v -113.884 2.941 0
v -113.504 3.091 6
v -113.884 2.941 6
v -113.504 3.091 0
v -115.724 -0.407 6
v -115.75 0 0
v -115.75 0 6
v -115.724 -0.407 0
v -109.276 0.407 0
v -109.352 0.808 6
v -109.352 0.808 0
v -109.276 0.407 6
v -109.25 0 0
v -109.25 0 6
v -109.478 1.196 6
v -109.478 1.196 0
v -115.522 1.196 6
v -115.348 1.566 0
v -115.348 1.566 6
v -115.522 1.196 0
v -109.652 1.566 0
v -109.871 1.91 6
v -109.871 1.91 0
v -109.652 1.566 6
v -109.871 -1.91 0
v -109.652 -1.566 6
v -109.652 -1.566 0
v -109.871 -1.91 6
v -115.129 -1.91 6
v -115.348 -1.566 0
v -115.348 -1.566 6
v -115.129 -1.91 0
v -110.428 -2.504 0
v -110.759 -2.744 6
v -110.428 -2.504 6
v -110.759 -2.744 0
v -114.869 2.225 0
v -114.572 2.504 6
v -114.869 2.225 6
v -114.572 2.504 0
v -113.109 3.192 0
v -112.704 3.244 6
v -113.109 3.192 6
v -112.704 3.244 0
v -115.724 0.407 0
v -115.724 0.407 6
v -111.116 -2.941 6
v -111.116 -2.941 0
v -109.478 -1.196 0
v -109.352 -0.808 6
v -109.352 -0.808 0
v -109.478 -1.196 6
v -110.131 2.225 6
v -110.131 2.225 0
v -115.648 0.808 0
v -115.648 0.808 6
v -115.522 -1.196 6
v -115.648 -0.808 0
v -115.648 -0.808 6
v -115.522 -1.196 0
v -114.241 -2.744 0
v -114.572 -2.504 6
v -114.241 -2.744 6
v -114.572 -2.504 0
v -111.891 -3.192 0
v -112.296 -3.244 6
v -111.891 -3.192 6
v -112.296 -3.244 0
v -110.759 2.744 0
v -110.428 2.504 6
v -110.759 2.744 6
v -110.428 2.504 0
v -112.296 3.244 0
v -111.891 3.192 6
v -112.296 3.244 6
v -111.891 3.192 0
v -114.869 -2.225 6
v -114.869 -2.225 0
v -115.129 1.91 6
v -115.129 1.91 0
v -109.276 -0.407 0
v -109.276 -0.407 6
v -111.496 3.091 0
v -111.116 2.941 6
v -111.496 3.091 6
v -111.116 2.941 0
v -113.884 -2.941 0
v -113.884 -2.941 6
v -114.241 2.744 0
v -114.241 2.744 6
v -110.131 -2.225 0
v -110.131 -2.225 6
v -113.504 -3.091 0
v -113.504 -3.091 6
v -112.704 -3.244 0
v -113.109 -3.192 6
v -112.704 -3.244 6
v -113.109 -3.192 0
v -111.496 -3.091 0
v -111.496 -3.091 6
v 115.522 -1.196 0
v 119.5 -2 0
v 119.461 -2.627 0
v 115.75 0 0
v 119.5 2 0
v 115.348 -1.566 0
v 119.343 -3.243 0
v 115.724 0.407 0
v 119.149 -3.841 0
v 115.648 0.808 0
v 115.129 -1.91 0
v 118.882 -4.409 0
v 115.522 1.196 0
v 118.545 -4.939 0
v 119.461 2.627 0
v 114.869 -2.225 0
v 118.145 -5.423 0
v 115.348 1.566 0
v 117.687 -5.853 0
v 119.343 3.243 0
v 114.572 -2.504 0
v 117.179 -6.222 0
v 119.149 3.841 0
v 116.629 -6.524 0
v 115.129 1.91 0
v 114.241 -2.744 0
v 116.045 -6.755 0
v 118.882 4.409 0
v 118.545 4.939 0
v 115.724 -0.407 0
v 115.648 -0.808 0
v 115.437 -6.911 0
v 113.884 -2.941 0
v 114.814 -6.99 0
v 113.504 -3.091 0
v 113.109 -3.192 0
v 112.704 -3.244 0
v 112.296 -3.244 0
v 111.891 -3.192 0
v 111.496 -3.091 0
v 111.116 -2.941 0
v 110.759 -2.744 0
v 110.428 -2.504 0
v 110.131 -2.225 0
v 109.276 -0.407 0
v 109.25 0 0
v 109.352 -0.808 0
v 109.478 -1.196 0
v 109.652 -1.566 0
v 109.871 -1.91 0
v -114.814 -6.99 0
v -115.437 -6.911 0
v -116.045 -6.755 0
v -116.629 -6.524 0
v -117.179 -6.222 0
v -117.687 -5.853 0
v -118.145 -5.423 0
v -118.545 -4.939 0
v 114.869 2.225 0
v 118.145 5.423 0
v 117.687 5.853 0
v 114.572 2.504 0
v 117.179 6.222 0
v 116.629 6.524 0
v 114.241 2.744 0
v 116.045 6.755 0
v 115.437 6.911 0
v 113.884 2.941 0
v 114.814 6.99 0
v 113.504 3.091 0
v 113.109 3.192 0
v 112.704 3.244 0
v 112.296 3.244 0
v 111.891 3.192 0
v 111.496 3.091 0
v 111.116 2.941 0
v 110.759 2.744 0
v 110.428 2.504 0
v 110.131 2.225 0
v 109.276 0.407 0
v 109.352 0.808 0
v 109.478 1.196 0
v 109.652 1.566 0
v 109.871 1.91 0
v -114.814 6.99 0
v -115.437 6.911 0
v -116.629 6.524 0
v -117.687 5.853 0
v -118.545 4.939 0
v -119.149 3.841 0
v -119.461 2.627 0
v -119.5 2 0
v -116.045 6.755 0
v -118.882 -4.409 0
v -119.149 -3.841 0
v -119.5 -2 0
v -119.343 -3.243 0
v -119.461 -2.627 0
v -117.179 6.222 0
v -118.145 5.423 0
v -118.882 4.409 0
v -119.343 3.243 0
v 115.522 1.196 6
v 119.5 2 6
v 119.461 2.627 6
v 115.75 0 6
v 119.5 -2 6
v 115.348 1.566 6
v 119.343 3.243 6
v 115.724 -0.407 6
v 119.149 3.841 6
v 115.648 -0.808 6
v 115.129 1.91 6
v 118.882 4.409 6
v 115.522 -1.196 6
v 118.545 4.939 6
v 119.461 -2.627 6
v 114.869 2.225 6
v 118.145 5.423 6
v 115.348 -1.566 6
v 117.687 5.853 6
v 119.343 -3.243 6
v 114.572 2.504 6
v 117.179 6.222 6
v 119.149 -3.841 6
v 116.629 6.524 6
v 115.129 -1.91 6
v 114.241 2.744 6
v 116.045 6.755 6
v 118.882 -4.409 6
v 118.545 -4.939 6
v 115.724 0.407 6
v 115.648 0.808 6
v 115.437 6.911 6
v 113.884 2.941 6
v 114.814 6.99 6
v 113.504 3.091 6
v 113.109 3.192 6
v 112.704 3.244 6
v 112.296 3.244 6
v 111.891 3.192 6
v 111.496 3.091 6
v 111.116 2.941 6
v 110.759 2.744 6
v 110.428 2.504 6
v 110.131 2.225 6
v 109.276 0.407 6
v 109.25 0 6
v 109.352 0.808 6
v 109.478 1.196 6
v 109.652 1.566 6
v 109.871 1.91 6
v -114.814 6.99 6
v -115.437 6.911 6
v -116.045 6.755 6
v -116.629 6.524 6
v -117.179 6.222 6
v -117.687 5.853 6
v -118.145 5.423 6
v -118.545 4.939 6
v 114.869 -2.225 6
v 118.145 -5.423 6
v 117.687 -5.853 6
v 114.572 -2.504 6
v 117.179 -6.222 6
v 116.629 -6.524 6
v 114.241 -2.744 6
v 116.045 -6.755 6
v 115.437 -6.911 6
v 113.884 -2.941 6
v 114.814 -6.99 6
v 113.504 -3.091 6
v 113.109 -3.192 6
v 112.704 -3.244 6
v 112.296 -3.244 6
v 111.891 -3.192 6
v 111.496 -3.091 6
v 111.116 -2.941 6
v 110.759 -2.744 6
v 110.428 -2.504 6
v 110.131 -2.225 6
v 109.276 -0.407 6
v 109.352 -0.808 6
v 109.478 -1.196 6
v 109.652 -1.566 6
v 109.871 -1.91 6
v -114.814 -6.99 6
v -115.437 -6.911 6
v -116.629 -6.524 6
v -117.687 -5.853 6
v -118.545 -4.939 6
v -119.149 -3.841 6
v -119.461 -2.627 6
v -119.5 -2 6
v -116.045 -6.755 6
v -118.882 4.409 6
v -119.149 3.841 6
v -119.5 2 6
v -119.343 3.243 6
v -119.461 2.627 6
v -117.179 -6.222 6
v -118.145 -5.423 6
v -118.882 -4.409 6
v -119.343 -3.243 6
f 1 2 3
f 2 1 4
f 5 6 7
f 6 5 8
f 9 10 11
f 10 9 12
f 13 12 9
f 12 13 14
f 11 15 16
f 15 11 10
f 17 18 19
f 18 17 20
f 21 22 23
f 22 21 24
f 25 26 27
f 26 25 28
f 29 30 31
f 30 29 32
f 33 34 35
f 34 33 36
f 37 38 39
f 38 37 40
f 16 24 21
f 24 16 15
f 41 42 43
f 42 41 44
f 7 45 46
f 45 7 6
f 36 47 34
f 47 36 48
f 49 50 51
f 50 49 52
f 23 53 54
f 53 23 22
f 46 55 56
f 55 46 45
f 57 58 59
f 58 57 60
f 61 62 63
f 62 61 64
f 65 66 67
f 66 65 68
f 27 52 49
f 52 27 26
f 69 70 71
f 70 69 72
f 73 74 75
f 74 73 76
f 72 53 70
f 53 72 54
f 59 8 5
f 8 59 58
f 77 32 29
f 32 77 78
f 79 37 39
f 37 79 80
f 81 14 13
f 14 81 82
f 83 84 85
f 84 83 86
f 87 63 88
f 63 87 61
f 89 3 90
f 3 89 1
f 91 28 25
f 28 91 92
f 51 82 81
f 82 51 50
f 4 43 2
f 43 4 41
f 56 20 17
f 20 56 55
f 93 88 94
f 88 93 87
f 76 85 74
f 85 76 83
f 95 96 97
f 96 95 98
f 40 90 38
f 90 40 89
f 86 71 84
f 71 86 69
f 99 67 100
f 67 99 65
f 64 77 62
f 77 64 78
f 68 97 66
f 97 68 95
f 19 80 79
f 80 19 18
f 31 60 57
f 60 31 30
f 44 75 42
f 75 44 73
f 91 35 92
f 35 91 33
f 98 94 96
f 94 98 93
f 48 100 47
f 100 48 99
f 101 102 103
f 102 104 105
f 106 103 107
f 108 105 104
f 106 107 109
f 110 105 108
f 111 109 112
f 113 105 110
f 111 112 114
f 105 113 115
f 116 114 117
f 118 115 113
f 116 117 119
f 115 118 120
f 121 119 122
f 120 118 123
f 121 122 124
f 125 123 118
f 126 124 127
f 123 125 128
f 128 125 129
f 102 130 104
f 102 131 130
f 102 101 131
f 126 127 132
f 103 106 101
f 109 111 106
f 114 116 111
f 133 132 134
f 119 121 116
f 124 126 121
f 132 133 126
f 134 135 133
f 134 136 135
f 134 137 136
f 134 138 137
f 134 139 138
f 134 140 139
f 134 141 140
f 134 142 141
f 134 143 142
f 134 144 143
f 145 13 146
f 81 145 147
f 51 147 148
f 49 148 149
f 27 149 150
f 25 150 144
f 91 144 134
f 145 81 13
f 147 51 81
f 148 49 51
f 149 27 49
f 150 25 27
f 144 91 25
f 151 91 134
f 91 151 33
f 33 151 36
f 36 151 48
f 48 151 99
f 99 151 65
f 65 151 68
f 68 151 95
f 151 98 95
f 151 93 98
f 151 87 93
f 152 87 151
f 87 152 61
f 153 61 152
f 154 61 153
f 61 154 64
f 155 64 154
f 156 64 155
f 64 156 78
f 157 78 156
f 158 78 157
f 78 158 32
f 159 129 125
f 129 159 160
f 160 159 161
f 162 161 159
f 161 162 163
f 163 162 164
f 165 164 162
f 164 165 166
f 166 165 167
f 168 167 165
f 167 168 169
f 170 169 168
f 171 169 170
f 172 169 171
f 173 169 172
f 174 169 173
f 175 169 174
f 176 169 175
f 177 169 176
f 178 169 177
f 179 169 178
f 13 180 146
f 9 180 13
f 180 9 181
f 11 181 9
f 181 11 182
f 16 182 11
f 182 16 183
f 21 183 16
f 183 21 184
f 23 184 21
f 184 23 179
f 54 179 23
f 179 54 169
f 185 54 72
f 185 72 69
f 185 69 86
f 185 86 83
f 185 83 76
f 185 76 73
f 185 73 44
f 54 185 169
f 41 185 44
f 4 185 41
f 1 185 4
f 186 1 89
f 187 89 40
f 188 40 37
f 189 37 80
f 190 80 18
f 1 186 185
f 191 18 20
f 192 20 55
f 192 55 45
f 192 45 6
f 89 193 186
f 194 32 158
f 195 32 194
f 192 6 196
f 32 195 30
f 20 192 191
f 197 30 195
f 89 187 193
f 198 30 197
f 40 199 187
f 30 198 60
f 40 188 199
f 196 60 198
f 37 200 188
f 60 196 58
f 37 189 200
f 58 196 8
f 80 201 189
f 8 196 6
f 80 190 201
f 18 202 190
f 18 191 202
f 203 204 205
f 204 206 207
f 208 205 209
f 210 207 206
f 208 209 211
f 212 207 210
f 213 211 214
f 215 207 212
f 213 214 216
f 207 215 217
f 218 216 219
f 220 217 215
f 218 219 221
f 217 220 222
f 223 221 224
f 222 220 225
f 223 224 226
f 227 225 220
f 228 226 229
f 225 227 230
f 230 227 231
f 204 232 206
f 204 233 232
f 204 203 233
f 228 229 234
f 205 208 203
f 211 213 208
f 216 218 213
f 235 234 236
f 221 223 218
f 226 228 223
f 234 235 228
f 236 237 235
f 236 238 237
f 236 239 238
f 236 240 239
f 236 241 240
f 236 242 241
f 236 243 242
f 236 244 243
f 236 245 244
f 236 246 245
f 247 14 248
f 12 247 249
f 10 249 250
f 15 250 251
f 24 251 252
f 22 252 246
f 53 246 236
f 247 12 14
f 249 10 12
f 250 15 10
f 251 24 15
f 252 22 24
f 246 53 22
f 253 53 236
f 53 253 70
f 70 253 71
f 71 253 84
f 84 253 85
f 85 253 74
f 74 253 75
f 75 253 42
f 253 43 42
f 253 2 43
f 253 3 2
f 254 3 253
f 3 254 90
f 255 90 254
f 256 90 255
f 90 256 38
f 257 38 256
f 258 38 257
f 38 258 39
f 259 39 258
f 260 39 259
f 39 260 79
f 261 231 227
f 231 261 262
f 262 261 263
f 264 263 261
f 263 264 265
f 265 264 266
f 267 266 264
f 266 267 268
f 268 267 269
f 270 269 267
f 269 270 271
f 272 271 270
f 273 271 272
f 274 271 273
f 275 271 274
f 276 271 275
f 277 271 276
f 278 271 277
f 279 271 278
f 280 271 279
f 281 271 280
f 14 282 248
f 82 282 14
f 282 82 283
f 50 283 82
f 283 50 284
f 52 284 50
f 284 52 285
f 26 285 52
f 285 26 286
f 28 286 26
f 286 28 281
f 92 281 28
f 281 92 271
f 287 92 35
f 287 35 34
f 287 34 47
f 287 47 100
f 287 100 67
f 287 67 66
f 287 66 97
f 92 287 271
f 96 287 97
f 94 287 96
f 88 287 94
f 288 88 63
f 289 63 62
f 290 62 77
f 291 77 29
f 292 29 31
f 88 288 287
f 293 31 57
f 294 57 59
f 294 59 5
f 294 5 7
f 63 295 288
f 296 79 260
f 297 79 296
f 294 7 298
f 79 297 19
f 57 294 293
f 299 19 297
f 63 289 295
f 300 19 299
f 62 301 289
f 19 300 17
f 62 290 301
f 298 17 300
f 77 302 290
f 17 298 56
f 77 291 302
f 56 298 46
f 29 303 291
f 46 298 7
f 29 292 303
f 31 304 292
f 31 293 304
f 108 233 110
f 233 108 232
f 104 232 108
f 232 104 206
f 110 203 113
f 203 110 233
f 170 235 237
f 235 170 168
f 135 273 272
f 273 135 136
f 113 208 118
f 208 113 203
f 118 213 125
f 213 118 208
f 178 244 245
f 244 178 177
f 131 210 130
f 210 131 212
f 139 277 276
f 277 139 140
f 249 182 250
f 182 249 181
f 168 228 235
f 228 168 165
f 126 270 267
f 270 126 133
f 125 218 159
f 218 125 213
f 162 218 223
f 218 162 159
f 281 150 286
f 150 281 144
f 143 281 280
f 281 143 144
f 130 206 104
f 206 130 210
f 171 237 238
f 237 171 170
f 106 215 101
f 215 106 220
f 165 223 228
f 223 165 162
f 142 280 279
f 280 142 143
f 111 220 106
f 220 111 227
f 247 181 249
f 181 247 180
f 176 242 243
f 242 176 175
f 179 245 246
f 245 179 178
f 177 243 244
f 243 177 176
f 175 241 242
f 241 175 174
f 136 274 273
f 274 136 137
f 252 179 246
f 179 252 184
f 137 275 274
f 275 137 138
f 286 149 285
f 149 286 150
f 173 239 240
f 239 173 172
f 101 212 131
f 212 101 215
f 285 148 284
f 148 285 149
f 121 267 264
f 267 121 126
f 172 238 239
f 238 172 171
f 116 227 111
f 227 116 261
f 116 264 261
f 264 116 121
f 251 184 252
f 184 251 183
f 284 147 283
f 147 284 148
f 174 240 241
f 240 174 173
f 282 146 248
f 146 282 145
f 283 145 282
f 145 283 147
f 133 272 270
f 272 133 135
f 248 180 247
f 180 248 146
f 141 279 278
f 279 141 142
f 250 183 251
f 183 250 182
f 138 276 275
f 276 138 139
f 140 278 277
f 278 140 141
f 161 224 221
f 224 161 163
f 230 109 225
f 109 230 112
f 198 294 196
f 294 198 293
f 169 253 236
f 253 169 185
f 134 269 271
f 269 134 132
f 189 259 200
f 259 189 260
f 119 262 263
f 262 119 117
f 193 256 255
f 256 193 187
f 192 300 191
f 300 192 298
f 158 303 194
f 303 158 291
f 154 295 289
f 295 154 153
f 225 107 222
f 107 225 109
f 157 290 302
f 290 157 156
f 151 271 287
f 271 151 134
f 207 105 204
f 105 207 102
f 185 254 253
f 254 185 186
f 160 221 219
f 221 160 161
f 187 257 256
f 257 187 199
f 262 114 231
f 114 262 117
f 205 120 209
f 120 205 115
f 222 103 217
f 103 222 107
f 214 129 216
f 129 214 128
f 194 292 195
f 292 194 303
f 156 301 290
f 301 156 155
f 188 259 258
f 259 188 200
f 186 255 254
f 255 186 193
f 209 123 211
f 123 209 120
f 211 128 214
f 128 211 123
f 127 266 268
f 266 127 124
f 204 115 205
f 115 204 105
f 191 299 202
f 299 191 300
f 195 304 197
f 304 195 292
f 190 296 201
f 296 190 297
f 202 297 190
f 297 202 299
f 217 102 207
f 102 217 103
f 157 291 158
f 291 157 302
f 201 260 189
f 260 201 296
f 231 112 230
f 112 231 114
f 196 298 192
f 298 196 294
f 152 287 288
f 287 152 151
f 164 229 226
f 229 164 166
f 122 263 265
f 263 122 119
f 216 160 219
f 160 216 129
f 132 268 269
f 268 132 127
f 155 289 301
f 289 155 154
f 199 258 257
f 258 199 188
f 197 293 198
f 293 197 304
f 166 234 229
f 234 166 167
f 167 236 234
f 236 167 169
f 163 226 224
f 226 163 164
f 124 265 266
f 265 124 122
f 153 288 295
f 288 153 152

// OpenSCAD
$fn = 50;


difference() {
	union() {
		hull() {
			translate(v = [-114.5000000000, 2.0000000000, 0]) {
				cylinder(h = 6, r = 5);
			}
			translate(v = [114.5000000000, 2.0000000000, 0]) {
				cylinder(h = 6, r = 5);
			}
			translate(v = [-114.5000000000, -2.0000000000, 0]) {
				cylinder(h = 6, r = 5);
			}
			translate(v = [114.5000000000, -2.0000000000, 0]) {
				cylinder(h = 6, r = 5);
			}
		}
	}
	union() {
		translate(v = [-112.5000000000, 0.0000000000, 0]) {
			cylinder(h = 6, r = 3.2500000000);
		}
		translate(v = [112.5000000000, 0.0000000000, 0]) {
			cylinder(h = 6, r = 3.2500000000);
		}
		translate(v = [-112.5000000000, 0.0000000000, 0]) {
			cylinder(h = 6, r = 1.8000000000);
		}
		translate(v = [112.5000000000, 0.0000000000, 0]) {
			cylinder(h = 6, r = 1.8000000000);
		}
		translate(v = [-112.5000000000, 0.0000000000, 0]) {
			cylinder(h = 6, r = 1.8000000000);
		}
		translate(v = [112.5000000000, 0.0000000000, 0]) {
			cylinder(h = 6, r = 1.8000000000);
		}
		translate(v = [-112.5000000000, 0.0000000000, 0]) {
			cylinder(h = 6, r = 1.8000000000);
		}
		translate(v = [112.5000000000, 0.0000000000, 0]) {
			cylinder(h = 6, r = 1.8000000000);
		}
	}
}
